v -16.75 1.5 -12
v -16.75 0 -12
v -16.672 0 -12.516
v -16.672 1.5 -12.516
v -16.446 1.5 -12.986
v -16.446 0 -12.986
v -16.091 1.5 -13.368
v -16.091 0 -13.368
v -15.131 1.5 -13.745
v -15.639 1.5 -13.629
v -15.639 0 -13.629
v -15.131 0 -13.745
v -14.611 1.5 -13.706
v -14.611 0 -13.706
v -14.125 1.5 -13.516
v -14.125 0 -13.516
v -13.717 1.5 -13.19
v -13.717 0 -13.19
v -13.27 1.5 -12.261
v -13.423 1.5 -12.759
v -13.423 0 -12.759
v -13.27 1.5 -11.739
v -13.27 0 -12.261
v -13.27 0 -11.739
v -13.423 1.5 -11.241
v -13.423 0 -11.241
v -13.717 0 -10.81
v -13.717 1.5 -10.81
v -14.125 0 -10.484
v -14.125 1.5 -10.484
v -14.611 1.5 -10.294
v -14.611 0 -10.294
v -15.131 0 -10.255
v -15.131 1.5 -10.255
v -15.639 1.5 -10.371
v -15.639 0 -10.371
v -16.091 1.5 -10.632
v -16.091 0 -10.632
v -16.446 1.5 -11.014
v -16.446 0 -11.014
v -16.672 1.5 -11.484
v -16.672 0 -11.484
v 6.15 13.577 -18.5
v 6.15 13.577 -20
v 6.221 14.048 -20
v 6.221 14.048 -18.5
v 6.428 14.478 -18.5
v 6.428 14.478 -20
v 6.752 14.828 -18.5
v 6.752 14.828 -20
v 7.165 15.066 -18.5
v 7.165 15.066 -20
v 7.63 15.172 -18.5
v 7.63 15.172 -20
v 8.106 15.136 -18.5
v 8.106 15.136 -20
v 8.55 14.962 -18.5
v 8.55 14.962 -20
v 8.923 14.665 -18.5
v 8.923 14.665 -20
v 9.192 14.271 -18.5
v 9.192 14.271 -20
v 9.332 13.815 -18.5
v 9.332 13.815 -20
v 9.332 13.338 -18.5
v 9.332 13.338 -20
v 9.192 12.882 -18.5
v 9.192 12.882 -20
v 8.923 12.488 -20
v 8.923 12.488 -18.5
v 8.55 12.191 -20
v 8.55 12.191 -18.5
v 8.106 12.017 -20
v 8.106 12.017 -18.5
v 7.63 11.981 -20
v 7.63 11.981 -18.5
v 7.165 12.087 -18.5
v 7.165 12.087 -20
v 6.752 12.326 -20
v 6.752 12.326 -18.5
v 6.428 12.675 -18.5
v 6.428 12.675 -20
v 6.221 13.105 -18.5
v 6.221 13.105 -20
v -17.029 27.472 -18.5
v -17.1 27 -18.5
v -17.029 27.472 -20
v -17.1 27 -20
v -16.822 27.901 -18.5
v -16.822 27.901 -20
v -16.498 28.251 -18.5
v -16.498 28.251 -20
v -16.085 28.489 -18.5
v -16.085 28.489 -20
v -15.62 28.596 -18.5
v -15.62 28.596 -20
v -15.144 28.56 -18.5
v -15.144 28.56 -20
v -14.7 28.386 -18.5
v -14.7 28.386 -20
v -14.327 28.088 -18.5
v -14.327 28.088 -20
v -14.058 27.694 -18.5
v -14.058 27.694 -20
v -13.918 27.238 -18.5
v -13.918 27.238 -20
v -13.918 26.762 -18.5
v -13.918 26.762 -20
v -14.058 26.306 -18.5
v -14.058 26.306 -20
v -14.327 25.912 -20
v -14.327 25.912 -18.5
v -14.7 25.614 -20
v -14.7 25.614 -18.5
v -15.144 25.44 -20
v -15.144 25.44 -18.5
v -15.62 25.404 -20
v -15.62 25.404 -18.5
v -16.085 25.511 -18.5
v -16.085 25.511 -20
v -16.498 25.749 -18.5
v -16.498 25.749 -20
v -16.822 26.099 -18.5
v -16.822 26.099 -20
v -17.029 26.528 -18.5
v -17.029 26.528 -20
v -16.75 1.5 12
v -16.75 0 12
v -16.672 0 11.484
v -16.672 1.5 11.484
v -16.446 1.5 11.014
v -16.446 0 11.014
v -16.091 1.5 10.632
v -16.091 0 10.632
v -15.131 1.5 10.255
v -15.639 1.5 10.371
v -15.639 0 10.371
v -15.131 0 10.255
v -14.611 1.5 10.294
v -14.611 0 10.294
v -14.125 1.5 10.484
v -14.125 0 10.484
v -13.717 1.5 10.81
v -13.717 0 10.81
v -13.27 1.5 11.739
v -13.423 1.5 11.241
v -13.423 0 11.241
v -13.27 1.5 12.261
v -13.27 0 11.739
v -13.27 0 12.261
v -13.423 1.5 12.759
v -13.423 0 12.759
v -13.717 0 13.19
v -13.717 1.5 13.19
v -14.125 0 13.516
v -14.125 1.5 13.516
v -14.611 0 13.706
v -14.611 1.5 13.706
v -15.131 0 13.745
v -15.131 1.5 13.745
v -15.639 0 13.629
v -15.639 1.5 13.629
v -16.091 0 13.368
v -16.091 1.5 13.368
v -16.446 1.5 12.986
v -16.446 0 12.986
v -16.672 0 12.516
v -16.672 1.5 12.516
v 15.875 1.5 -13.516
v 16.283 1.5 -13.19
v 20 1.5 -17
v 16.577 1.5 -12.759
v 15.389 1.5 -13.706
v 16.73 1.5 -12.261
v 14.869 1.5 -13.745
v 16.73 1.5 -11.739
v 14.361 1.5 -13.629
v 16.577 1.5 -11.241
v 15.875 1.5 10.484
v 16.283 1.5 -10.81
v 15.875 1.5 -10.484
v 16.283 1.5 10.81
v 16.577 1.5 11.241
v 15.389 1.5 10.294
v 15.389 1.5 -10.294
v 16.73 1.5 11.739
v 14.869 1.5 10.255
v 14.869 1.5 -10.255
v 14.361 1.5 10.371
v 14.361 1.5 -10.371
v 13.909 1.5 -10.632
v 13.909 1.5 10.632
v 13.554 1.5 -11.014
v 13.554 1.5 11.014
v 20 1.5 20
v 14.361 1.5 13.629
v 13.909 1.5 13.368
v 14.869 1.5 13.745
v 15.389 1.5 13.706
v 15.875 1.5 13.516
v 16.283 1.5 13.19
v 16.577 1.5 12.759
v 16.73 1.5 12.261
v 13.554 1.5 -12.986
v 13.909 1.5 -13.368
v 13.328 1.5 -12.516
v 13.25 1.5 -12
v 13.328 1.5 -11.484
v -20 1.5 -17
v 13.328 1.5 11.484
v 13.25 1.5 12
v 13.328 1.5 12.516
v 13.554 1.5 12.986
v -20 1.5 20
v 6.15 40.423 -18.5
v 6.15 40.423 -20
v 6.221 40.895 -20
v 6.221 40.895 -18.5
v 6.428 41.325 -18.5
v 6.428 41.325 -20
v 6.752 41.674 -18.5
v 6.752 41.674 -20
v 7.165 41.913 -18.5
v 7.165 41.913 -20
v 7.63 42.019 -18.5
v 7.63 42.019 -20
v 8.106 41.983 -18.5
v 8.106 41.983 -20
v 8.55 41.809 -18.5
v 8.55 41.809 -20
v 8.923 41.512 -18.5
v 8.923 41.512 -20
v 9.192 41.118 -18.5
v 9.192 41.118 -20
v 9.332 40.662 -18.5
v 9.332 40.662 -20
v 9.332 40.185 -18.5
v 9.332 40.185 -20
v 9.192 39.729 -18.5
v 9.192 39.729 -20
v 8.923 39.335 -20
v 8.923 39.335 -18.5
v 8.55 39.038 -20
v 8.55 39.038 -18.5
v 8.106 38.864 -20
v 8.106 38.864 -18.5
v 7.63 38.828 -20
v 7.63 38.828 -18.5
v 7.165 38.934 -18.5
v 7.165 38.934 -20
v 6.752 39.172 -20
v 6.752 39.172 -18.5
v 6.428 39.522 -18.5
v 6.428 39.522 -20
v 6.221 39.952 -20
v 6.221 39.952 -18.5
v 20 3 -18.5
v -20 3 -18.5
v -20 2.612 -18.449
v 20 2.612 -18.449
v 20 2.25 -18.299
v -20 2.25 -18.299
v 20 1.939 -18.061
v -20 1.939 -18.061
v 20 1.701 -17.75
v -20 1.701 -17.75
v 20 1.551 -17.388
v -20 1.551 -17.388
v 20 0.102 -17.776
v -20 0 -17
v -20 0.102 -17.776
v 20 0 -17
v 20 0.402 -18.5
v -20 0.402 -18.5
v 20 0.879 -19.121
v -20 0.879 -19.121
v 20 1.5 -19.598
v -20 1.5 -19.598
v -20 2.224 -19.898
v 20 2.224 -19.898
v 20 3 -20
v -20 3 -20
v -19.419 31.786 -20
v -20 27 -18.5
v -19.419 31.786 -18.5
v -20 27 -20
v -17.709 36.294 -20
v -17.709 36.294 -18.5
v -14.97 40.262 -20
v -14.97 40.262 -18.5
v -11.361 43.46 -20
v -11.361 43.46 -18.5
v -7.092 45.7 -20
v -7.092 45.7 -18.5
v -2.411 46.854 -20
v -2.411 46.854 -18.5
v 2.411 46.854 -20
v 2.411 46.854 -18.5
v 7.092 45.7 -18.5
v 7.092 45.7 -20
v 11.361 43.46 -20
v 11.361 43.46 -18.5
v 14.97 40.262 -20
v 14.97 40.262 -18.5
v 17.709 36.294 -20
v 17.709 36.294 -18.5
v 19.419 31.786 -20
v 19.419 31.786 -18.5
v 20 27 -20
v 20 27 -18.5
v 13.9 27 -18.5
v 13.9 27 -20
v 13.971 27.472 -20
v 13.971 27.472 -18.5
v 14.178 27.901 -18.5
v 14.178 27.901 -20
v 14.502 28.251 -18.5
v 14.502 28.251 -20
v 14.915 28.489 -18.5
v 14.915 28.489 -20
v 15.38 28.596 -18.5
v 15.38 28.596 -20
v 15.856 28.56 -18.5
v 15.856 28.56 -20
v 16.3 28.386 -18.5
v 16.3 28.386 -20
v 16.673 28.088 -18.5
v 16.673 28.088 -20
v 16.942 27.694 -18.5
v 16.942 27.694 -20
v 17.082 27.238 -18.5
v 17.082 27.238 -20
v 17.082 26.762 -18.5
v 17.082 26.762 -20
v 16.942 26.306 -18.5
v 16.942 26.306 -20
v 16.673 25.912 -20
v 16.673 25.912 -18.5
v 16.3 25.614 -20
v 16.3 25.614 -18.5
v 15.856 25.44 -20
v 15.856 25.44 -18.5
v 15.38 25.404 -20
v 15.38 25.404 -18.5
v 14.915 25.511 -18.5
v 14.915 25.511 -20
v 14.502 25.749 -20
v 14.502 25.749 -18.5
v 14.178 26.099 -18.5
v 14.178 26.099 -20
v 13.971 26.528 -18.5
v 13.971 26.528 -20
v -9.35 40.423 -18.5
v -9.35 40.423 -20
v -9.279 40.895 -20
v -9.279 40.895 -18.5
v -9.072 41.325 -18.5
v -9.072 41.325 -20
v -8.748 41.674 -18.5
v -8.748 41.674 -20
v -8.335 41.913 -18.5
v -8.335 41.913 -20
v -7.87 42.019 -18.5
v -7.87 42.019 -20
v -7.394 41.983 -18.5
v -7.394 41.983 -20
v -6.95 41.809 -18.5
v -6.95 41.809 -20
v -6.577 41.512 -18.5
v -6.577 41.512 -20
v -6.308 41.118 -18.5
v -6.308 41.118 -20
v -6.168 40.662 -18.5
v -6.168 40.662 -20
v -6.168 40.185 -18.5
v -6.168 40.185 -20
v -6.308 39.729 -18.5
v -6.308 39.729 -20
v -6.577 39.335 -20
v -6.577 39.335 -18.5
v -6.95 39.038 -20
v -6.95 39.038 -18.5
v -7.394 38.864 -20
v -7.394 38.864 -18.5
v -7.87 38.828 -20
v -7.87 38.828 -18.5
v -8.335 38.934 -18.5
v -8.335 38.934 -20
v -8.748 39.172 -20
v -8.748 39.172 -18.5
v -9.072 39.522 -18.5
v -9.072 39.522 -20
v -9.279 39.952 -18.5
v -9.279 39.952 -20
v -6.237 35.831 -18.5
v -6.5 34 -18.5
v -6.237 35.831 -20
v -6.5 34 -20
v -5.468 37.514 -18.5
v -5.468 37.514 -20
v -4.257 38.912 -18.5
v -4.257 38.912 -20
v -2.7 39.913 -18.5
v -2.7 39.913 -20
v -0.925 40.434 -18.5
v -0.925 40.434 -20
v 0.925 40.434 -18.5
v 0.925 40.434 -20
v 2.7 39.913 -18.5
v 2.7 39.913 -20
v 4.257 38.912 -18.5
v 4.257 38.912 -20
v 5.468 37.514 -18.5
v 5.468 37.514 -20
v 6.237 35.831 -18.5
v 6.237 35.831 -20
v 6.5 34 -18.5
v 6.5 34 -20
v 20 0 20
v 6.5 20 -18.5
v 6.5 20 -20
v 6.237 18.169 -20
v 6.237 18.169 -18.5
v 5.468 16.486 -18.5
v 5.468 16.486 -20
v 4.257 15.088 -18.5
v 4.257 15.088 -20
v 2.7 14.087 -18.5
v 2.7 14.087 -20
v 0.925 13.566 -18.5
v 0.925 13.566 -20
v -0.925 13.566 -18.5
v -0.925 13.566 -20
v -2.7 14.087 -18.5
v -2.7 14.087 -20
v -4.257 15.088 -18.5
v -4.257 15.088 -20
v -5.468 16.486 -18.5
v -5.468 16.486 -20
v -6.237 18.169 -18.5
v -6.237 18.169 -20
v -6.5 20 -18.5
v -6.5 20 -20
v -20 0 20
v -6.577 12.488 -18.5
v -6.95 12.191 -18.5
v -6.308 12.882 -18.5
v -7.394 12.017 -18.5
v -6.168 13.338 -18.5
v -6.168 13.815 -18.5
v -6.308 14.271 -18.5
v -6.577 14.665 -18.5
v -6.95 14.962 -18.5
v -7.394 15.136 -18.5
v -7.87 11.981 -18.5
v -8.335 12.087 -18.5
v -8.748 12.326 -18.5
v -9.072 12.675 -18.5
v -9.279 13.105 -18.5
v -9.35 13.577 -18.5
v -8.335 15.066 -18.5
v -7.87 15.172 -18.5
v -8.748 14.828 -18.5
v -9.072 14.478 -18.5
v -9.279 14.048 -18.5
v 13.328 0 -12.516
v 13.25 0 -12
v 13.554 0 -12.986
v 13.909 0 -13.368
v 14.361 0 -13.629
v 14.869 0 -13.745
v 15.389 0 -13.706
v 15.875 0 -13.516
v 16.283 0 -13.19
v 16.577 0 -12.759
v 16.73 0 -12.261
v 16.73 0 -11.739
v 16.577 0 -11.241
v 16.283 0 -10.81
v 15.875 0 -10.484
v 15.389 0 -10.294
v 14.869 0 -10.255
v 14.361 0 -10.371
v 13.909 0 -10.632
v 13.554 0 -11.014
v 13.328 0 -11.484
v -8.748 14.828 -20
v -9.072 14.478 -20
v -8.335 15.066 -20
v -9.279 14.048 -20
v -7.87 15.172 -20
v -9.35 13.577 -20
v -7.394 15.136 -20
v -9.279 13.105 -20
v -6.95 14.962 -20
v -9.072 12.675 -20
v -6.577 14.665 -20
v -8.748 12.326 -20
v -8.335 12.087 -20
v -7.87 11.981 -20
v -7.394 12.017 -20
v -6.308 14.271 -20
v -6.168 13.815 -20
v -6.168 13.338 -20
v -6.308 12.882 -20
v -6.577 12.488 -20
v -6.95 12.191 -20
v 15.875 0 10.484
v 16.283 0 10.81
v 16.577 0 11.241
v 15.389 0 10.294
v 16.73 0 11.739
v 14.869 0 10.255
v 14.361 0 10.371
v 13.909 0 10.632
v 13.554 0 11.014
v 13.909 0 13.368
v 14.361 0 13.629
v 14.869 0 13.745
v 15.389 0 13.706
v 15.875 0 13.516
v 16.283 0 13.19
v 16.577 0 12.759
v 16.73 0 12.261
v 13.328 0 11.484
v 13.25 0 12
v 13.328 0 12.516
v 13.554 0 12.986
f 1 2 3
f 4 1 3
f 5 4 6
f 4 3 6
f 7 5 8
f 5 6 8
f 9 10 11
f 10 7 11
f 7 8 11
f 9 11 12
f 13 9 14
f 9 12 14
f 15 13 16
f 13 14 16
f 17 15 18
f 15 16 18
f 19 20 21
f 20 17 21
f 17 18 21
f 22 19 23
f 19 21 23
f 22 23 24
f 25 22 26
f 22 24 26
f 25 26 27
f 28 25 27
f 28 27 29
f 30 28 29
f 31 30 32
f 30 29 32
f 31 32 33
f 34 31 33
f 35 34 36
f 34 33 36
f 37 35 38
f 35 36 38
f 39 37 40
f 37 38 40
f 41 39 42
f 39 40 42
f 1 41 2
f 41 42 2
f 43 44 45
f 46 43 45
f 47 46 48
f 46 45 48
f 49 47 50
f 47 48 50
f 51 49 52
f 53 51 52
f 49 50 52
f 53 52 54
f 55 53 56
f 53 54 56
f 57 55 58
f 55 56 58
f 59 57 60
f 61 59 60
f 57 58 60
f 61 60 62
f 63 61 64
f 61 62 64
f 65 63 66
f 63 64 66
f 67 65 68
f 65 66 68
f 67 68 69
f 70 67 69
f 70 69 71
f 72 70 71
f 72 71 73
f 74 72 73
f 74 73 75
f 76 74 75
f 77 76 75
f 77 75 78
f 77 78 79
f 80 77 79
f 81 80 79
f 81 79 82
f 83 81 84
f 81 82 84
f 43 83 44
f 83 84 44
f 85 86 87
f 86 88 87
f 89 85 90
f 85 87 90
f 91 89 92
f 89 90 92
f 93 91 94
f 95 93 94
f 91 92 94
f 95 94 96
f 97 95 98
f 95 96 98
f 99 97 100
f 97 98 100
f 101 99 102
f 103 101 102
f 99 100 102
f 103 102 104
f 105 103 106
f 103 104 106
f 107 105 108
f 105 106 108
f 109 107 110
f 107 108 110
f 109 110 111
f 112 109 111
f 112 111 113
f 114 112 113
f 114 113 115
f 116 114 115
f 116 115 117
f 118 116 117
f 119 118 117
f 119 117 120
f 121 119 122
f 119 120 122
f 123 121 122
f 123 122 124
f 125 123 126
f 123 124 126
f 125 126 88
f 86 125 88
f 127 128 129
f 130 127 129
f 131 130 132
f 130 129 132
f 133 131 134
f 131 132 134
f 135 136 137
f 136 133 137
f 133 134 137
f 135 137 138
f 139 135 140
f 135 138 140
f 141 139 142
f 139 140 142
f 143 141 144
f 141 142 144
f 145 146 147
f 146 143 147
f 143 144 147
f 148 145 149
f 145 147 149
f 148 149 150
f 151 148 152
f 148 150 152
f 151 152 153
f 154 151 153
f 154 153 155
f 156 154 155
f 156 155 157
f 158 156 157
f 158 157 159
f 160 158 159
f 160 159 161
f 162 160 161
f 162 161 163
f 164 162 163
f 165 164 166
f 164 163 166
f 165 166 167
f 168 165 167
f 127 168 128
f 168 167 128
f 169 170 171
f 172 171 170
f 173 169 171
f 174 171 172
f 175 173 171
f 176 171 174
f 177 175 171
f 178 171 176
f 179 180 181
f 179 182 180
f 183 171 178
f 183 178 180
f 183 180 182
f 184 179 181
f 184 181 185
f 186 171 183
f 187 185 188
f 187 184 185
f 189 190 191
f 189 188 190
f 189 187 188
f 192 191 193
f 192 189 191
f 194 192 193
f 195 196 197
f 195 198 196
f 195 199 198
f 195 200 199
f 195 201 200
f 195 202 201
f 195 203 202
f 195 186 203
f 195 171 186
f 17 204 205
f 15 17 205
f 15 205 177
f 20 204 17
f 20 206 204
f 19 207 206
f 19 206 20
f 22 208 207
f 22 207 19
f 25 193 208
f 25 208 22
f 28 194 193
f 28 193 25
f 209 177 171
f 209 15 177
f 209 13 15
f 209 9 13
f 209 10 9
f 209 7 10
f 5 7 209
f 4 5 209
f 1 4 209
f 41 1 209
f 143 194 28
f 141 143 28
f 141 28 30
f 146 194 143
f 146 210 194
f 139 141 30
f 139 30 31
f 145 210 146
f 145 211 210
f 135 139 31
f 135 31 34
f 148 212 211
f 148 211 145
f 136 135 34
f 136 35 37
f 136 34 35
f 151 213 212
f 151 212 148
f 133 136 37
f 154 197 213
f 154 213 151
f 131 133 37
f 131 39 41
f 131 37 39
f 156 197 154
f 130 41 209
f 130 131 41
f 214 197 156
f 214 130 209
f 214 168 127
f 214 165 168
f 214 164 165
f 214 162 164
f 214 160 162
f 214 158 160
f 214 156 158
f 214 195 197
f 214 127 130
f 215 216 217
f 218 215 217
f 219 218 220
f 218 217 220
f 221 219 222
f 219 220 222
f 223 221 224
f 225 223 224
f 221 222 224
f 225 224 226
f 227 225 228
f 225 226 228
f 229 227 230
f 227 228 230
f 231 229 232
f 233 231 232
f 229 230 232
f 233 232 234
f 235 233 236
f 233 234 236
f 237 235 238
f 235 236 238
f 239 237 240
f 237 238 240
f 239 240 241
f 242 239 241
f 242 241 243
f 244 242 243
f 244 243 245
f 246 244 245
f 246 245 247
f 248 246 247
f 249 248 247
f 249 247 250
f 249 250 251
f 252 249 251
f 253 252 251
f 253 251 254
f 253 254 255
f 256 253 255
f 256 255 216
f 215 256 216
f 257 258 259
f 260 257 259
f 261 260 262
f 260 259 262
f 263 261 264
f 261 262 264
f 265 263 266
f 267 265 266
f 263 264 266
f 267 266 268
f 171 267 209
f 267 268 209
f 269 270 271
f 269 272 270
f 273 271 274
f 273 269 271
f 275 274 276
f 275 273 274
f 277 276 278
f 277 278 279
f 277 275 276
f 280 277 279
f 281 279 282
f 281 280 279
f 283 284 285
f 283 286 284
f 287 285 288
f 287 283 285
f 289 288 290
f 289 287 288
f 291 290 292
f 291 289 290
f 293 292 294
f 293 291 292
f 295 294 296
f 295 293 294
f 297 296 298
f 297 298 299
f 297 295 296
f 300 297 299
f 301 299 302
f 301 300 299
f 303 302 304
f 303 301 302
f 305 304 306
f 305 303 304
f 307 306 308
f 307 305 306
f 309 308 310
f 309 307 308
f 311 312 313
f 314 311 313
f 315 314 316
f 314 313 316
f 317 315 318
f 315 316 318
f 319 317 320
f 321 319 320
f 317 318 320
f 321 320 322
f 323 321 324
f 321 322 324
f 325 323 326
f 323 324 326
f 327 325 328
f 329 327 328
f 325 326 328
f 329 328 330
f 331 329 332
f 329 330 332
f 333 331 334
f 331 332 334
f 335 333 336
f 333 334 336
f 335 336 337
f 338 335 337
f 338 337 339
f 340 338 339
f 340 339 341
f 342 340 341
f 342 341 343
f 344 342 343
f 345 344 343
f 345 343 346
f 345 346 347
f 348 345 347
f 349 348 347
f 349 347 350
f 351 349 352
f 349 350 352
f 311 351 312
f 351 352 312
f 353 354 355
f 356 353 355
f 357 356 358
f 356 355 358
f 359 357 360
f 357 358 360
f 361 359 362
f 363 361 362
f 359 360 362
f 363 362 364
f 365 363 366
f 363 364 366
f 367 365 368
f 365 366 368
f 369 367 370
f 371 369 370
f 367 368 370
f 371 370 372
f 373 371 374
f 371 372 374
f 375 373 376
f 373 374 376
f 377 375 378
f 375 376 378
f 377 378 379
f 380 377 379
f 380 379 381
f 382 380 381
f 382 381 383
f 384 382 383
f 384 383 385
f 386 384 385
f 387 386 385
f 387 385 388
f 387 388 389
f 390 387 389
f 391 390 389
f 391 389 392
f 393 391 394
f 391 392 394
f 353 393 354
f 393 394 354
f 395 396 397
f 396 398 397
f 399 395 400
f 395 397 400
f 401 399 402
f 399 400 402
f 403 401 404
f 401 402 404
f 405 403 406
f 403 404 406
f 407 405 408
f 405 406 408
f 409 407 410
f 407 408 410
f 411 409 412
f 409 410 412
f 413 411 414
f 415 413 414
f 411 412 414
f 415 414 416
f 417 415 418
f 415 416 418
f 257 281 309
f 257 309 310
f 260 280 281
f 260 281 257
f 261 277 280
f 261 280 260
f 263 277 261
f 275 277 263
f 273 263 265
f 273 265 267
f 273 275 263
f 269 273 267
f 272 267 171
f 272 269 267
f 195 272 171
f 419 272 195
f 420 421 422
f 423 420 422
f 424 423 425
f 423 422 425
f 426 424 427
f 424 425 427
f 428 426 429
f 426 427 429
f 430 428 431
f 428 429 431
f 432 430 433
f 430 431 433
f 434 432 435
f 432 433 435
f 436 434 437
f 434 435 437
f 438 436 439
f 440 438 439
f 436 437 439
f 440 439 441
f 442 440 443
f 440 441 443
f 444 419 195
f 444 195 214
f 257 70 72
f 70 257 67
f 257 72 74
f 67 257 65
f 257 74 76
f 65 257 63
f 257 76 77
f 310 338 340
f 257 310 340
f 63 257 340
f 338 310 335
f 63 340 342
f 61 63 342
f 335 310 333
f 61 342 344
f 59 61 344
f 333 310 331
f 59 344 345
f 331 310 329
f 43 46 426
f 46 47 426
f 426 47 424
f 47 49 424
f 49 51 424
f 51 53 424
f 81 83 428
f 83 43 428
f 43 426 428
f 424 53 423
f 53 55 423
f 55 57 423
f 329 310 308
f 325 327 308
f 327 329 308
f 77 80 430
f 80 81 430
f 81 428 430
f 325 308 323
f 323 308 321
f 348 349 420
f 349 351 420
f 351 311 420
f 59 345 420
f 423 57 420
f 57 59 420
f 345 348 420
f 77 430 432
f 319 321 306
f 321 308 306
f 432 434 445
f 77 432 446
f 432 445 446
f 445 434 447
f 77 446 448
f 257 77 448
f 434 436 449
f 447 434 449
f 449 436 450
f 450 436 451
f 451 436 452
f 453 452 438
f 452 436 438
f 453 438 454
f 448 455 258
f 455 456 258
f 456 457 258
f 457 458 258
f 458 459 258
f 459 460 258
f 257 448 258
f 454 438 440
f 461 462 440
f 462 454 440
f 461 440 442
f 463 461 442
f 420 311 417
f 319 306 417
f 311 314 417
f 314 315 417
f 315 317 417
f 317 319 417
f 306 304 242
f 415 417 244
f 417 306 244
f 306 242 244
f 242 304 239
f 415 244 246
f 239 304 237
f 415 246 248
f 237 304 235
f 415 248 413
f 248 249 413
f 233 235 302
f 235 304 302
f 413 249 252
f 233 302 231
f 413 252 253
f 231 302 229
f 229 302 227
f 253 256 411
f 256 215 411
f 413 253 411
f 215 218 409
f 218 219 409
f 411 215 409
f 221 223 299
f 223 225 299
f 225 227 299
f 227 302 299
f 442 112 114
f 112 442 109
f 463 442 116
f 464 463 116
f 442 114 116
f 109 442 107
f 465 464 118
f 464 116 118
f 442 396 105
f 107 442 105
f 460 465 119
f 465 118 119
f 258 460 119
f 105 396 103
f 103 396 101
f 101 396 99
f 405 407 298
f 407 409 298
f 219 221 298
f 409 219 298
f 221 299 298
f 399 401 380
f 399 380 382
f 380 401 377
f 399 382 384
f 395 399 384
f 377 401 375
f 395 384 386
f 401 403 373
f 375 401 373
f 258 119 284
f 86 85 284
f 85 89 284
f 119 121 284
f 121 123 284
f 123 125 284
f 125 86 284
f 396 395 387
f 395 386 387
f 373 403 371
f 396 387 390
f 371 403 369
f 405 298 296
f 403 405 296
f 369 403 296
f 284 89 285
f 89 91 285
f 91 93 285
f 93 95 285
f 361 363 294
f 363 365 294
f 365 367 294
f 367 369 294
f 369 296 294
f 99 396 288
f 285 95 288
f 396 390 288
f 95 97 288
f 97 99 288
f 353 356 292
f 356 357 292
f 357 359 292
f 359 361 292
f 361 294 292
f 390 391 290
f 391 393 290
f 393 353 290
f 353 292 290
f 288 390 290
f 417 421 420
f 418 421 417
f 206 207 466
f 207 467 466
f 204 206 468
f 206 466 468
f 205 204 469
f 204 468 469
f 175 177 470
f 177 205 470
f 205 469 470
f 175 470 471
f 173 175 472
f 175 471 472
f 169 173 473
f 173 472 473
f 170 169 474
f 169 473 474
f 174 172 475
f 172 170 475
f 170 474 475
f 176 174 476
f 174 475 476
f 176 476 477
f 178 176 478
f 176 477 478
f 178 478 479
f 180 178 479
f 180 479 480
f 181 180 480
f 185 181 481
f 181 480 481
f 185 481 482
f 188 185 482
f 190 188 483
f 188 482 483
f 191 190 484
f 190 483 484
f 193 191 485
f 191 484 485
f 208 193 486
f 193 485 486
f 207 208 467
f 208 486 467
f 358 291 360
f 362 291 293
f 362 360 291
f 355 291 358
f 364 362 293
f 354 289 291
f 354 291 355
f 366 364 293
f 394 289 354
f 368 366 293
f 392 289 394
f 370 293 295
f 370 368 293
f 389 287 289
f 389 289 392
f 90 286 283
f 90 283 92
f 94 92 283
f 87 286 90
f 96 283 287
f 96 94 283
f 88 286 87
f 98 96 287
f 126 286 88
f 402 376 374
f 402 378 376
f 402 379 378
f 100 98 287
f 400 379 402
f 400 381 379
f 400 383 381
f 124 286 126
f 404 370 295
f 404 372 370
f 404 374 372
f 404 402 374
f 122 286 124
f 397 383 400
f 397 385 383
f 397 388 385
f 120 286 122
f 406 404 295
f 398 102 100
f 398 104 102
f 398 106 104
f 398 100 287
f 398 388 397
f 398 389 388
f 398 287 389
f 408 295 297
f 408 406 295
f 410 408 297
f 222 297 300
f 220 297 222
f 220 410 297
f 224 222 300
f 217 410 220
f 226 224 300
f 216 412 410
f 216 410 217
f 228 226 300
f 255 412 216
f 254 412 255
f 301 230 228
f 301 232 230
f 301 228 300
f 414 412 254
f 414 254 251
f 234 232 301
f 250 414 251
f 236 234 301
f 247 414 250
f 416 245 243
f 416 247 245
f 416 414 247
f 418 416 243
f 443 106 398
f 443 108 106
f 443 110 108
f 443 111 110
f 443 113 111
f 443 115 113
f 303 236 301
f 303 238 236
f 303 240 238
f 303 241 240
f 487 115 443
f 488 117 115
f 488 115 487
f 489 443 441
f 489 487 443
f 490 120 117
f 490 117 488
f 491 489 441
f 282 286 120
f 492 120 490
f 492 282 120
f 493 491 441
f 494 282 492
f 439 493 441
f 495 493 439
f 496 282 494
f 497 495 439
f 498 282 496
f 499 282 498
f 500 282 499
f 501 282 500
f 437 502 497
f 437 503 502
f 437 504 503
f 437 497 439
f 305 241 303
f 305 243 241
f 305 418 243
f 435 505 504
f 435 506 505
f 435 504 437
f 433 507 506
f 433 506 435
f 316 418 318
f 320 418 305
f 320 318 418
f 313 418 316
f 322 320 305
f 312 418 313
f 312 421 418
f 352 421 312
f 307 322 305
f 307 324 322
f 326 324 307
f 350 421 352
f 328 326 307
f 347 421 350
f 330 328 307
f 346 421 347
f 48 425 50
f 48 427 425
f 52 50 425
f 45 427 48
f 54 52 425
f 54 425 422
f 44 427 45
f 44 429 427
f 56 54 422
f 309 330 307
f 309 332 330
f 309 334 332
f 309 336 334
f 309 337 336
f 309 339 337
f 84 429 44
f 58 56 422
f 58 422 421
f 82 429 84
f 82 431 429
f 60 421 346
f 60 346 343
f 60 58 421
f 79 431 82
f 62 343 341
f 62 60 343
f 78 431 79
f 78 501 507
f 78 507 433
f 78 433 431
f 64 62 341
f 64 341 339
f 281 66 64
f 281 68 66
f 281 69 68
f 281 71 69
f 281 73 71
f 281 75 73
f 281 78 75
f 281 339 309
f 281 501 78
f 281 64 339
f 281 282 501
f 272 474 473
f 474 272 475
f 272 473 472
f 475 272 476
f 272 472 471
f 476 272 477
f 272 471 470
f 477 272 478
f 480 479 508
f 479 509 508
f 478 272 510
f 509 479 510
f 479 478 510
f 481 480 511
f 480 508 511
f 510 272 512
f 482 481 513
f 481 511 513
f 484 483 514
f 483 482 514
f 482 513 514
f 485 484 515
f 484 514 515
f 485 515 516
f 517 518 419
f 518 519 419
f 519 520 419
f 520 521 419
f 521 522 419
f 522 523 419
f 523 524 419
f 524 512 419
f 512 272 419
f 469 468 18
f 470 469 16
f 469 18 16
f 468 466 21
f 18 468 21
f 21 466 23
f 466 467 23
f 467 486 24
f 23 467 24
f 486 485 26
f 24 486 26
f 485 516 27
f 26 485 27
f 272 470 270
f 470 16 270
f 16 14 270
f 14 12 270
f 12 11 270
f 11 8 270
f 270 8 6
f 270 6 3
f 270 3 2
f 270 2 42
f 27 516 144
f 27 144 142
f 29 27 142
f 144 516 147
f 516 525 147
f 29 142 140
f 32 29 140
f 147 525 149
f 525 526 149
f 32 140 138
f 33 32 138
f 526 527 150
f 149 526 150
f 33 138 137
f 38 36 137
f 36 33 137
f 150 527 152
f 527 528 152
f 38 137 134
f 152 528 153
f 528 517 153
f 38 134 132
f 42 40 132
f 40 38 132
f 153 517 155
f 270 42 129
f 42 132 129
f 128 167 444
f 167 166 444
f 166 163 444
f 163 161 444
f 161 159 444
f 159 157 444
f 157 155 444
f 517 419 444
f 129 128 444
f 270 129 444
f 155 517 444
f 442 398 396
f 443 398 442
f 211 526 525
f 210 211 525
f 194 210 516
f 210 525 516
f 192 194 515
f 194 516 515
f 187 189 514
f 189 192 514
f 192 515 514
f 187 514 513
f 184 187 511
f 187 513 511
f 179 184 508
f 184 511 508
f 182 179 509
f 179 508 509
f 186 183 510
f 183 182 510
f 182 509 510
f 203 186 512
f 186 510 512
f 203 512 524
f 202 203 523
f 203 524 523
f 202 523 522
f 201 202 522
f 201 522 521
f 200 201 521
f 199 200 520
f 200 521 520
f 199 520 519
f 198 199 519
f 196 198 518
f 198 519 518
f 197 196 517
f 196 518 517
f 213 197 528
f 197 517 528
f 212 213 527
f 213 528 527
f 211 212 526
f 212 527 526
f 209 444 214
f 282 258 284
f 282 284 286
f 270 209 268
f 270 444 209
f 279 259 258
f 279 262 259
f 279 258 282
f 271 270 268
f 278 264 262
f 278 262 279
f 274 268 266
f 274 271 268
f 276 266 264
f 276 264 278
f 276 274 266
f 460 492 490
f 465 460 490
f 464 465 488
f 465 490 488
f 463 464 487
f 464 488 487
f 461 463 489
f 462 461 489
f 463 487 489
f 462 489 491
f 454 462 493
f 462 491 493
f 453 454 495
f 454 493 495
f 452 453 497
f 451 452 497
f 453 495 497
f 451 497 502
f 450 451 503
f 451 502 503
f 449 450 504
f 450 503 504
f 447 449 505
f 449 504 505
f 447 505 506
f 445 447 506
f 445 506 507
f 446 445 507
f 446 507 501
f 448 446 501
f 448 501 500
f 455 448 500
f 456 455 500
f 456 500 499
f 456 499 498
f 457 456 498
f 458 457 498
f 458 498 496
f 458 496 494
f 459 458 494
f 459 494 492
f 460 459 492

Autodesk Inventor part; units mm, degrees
ref_plane "YZ Plane" through (0, 0, 0) normal (1, 0, 0) x (0, 1, 0)
ref_plane "XZ Plane" through (0, 0, 0) normal (0, 1, 0) x (-1, 0, 0)
ref_plane "XY Plane" through (0, 0, 0) normal (0, 0, 1) x (1, 0, 0)
sketch "草图1" plane through (0, 0, 0) normal (0, 1, 0) x (-1, 0, 0)
  line L0 (-20, 20) -> (20, 20)
  line L1 (20, 20) -> (20, -20)
  line L2 (20, -20) -> (-20, -20)
  line L3 (-20, -20) -> (-20, 20)
  line L4 (-20, 20) -> (20, -20) construction
  line L5 (20, 20) -> (-20, -20) construction
  line L6 (0, 40.4687) -> (0, -51.5947)
  line L7 (-15, -12) -> (15, -12) construction
  line L8 (15, -12) -> (15, 12) construction
  line L9 (15, 12) -> (-15, 12) construction
  line L10 (-15, 12) -> (-15, -12) construction
  line L11 (-15, -12) -> (15, 12) construction
  line L12 (15, -12) -> (-15, 12) construction
  circle A0 centre (15, 12) radius 1.75
  circle A1 centre (15, -12) radius 1.75
  circle A2 centre (-15, -12) radius 1.75
  circle A3 centre (-15, 12) radius 1.75
  point P0 (0, 0)
  point P1 (0, 0)
  dimension "d0" = 40
  dimension "d1" = 40
  dimension "d2" = 8
  dimension "d3" = 24
  dimension "d4" = 30
  dimension "d5" = 3.5
  dimension "d6" = 3.5
  dimension "d7" = 3.5
  dimension "d8" = 3.5
extrude "拉伸1" add sketch "草图1" along normal blind 1.5
sketch "草图3" plane through (20, 0, -20) normal (0, 0, -1) x (-1, 0, 0)
  line L0 (0, 0) -> (40, 0)
  line L1 (40, 0) -> (40, 27)
  line L2 (40, 47) -> (20, 47) construction
  line L3 (0, 27) -> (0, 0)
  line L4 (0, 0) -> (0, 1.5) projected
  line L5 (40, 0) -> (40, 1.5) projected
  arc A0 (40, 27) -> (0, 27) centre (20, 27) ccw
  line L6 (40, 27) -> (40, 47) construction
  line L7 (20, 20) -> (20, 34) construction
  line L8 (13.5, 20) -> (13.5, 34)
  line L9 (26.5, 34) -> (26.5, 20)
  arc A1 (13.5, 20) -> (26.5, 20) centre (20, 20) ccw
  arc A2 (26.5, 34) -> (13.5, 34) centre (20, 34) ccw
  circle A3 centre (20, 27) radius 15.5 construction
  circle A4 centre (4.5, 27) radius 1.6
  line L10 (20, 27) -> (4.5, 27) construction
  circle A5 centre (12.25, 13.5766) radius 1.6
  circle A6 centre (27.75, 13.5766) radius 1.6
  circle A7 centre (35.5, 27) radius 1.6
  circle A8 centre (27.75, 40.4234) radius 1.6
  circle A9 centre (12.25, 40.4234) radius 1.6
  point P0 (20, 0)
  dimension "d19" = 31
  dimension "d16" = 47
  dimension "d17" = 7
  dimension "d18" = 6.5
  dimension "d20" = 3.2
  dimension "d23" = 360
extrude "拉伸3" add sketch "草图3" against normal blind 1.5
fillet "圆角3" radius 3 1 edges at (0, 0, -20)
fillet "圆角4" radius 1.5 1 edges at (0, 1.5, -18.5)
properties part number "电机支架"
